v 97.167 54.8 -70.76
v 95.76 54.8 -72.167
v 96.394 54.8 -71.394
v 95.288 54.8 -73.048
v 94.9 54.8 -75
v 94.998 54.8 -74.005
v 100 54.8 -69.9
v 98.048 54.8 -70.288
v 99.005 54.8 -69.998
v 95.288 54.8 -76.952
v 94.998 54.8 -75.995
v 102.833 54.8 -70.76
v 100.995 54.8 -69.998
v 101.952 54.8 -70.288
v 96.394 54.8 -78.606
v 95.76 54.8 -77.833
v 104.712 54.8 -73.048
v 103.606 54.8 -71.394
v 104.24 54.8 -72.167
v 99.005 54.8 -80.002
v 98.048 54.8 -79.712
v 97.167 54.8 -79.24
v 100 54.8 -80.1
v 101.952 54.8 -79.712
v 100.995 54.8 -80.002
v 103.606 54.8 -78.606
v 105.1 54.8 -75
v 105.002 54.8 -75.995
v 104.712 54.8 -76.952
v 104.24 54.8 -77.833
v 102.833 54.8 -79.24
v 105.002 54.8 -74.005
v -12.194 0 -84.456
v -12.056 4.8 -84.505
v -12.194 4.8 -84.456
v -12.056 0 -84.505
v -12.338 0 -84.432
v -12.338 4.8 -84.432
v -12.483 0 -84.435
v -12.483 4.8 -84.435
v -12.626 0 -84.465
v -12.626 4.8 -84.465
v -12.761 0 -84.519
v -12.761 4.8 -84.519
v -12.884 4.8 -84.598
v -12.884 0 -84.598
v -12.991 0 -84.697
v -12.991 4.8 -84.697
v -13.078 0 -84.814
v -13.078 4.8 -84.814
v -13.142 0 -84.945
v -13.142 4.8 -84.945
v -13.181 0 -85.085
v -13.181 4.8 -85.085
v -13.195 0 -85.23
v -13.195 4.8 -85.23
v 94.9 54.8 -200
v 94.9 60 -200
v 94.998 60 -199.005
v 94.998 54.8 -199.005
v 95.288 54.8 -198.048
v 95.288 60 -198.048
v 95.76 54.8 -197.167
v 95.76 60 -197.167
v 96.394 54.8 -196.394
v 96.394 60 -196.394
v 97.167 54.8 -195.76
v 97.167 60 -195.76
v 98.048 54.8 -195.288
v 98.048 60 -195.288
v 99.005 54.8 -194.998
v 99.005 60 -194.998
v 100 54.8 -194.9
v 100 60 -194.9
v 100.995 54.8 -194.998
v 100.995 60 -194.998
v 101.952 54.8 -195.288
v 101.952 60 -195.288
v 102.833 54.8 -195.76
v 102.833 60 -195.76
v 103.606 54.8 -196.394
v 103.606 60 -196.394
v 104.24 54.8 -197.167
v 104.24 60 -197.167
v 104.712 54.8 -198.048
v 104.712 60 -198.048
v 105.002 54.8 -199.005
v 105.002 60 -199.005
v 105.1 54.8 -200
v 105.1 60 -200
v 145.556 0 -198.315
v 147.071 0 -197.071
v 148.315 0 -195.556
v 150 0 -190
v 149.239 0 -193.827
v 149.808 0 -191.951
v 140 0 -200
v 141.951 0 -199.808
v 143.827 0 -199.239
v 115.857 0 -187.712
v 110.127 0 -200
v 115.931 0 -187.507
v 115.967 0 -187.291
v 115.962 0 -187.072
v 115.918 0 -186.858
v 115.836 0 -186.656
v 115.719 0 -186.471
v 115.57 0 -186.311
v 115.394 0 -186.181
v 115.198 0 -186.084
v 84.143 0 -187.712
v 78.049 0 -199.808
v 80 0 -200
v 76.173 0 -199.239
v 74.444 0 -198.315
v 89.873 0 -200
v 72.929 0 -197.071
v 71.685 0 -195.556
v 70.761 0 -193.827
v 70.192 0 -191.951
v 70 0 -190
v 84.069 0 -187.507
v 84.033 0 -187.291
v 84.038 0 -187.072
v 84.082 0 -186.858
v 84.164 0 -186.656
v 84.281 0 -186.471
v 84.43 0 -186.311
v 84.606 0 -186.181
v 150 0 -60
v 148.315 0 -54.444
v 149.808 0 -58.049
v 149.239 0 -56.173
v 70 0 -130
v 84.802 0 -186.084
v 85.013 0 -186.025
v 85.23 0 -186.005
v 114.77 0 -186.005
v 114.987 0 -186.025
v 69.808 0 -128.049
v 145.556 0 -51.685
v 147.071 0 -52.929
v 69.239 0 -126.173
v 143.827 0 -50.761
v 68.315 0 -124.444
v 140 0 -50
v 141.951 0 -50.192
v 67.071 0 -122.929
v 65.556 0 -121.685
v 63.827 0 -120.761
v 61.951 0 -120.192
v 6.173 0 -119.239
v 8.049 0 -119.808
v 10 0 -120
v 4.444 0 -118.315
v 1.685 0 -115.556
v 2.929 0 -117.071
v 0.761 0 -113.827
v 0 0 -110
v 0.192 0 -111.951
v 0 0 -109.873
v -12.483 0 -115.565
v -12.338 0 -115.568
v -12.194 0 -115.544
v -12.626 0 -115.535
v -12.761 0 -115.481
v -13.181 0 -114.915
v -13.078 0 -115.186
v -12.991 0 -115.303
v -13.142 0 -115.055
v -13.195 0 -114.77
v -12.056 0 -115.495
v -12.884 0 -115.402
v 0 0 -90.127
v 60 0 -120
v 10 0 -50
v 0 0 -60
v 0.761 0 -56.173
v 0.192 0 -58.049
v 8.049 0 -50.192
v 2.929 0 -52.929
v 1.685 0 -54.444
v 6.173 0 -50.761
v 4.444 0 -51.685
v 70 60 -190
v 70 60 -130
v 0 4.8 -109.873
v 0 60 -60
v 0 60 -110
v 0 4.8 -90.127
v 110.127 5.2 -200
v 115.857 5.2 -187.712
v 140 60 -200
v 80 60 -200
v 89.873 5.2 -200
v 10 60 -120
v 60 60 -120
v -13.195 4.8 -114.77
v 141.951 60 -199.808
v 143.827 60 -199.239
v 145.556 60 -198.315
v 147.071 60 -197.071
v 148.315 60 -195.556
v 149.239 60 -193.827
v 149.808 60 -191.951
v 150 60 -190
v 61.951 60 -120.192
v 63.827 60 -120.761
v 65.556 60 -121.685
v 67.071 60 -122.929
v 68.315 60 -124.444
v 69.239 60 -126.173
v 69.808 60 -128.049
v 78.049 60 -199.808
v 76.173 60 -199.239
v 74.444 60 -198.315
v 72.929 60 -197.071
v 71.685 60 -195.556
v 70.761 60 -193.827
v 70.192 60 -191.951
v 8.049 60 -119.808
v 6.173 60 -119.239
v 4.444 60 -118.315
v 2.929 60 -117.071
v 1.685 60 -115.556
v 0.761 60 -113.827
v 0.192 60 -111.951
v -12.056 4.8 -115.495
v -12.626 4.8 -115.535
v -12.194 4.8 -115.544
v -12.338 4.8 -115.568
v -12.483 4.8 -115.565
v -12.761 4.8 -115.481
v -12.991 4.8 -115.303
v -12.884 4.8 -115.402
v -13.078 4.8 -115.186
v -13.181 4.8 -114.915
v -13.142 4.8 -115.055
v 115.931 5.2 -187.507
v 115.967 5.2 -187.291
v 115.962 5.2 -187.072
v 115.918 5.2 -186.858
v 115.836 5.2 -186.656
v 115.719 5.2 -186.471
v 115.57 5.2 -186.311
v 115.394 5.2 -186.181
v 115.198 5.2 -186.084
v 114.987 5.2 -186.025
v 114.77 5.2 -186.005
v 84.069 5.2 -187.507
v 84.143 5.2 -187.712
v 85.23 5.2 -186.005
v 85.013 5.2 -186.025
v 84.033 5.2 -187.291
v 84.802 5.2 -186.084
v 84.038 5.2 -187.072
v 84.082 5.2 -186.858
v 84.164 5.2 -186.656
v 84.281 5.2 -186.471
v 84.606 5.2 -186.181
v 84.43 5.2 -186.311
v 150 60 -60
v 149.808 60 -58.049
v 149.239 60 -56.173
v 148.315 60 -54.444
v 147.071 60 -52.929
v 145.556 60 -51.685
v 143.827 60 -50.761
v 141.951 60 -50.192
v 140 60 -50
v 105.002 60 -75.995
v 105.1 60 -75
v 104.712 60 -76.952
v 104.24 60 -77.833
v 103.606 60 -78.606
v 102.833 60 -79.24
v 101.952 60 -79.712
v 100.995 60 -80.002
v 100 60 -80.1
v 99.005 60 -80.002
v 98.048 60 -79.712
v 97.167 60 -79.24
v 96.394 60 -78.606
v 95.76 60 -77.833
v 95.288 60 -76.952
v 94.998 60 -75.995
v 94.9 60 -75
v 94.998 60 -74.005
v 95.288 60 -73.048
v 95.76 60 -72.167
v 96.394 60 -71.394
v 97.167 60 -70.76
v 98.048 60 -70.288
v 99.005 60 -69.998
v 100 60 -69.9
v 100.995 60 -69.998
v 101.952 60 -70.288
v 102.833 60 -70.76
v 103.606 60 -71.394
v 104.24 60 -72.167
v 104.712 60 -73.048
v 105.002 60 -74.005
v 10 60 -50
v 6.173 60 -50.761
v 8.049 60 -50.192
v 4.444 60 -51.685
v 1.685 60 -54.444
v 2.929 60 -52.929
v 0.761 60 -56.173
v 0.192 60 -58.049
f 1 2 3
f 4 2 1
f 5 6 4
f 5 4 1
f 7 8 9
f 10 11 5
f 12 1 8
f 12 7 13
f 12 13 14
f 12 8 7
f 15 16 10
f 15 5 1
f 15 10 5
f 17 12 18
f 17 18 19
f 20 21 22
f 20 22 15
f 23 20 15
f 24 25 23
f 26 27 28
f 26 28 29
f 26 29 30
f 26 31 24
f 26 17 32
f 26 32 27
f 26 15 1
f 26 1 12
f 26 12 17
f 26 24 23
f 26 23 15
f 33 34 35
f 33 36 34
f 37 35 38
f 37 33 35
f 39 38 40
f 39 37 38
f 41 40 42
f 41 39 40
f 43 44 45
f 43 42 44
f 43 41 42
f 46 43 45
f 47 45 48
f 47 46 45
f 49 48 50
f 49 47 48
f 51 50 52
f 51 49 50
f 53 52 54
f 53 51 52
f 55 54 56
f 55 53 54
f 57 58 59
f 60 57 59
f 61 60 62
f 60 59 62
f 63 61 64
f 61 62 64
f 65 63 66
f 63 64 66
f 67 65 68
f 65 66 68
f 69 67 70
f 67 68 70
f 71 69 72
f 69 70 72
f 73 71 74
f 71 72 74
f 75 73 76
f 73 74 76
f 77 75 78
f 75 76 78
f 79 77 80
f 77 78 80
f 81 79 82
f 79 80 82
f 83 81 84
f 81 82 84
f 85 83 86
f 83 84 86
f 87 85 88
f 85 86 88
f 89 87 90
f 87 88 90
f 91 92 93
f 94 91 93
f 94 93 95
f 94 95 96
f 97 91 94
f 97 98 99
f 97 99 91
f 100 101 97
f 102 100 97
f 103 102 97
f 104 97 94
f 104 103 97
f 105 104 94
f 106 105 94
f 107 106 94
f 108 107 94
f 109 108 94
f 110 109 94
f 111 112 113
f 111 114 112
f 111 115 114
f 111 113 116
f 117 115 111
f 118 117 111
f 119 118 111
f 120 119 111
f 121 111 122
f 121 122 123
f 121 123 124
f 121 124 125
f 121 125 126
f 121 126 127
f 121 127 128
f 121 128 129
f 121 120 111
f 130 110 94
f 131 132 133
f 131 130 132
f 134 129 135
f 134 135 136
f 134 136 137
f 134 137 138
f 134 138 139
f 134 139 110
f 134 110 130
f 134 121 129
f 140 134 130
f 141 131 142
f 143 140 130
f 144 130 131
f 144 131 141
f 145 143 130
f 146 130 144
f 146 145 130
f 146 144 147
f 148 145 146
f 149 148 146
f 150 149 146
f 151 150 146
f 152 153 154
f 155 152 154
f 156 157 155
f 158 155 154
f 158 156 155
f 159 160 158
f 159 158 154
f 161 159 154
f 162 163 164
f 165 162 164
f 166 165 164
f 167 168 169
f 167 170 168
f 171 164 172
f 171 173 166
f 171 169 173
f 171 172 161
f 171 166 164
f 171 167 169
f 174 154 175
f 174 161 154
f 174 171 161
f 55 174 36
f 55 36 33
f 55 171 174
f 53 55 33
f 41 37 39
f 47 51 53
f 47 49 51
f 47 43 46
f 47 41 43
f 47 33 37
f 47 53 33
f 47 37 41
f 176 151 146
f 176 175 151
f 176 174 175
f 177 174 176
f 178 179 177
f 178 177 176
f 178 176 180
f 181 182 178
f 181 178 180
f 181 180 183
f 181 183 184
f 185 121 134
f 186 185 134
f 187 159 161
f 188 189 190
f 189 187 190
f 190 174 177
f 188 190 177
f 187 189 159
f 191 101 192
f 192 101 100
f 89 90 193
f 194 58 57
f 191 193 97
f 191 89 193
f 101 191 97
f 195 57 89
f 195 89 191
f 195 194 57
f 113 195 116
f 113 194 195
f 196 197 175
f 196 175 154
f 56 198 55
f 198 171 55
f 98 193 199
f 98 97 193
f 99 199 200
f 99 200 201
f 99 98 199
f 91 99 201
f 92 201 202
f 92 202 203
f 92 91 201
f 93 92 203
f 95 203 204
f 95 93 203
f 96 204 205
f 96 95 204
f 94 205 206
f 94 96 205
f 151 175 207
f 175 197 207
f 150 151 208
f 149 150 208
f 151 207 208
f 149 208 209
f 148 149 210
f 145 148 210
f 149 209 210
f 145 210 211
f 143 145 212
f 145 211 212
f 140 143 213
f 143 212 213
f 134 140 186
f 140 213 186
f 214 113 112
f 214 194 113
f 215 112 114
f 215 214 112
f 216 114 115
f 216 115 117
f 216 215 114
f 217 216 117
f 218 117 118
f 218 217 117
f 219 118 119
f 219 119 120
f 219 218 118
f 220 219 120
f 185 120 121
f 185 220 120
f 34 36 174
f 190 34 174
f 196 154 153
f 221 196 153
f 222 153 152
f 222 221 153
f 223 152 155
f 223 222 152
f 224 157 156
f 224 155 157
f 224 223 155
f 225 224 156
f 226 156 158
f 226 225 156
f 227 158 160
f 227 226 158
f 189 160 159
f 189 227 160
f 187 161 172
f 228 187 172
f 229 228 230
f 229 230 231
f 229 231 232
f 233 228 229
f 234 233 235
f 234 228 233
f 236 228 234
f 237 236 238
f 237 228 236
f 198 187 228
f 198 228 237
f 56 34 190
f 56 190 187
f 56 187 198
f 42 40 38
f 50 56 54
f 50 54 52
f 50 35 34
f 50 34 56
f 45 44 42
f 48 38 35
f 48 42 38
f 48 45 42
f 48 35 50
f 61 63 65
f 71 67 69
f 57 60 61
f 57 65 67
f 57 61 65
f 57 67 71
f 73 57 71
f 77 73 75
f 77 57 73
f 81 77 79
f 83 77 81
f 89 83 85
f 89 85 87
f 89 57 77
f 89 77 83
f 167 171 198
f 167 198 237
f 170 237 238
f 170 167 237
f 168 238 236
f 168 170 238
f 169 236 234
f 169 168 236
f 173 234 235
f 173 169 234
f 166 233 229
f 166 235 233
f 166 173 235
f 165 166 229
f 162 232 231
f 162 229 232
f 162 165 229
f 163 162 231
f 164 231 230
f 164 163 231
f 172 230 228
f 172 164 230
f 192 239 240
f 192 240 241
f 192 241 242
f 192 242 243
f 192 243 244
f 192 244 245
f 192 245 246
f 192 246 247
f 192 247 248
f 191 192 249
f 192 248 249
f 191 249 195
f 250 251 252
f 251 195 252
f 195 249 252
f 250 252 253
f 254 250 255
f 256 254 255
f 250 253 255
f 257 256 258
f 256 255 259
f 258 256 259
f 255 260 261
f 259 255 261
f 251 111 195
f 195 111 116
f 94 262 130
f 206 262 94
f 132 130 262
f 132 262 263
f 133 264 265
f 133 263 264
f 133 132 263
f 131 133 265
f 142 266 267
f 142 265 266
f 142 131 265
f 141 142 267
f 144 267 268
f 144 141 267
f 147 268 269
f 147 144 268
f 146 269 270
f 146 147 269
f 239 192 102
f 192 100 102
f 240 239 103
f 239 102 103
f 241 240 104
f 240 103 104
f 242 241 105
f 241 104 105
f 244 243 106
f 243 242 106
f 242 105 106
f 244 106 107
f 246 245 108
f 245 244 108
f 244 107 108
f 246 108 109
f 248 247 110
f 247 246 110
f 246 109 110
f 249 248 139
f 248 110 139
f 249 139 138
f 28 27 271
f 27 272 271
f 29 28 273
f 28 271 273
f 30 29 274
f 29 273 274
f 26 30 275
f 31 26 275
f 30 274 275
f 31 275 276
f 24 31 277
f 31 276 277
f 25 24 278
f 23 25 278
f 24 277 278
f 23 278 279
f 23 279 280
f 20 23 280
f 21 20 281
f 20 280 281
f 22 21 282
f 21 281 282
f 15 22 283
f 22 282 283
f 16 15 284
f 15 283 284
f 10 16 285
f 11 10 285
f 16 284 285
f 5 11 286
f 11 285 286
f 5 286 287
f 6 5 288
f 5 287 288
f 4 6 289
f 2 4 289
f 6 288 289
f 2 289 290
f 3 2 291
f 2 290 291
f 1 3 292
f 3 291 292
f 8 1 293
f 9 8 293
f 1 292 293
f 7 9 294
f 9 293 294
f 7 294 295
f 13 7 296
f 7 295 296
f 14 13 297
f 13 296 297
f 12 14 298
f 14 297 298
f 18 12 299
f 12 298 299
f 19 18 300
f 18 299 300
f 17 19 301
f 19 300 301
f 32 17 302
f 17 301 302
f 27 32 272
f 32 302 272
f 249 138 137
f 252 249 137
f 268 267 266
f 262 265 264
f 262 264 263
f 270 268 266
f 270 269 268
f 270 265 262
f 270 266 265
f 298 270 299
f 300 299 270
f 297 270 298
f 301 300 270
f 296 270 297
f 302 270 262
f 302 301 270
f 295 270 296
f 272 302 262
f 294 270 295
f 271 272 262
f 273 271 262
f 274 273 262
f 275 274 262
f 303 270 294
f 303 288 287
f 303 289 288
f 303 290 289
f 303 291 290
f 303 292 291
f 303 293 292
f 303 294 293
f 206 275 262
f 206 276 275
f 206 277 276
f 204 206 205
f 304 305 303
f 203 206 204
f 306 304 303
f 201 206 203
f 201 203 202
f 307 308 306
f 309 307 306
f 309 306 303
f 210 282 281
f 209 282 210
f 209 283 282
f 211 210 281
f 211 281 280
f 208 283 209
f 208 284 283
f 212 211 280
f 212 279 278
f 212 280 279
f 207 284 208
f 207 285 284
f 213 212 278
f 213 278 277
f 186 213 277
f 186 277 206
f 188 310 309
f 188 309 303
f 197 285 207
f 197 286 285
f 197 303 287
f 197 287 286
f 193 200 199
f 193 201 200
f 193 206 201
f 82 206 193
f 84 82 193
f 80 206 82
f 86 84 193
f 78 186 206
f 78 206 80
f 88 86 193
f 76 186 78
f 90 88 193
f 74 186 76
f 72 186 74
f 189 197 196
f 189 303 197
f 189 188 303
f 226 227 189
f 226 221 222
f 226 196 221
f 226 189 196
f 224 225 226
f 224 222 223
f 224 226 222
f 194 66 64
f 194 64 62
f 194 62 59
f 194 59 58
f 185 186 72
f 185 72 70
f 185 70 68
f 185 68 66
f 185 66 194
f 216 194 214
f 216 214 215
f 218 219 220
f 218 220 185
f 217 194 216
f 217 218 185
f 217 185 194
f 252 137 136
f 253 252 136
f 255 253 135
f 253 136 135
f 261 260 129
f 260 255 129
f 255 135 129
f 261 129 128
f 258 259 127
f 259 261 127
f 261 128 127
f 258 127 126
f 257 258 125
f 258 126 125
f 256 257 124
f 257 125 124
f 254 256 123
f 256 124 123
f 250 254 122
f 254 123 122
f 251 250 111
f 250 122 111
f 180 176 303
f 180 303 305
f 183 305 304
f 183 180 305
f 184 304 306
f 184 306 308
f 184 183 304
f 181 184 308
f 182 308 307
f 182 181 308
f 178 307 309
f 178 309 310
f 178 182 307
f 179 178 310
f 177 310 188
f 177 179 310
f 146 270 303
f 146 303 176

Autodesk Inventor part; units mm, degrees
ref_plane "YZ Plane" through (0, 0, 0) normal (1, 0, 0) x (0, 1, 0)
ref_plane "XZ Plane" through (0, 0, 0) normal (0, 1, 0) x (-1, 0, 0)
ref_plane "XY Plane" through (0, 0, 0) normal (0, 0, 1) x (1, 0, 0)
sketch "Sketch1" plane through (0, 0, 0) normal (0, 1, 0) x (-1, 0, 0)
  line L0 (0, 0) -> (-200, 0)
  line L1 (-200, 0) -> (-200, -200)
  line L2 (-200, -200) -> (0, -200)
  line L3 (0, -200) -> (0, 0)
  line L4 (-89.8726, -200) -> (-110.1274, -200)
  line L5 (-114.7696, -186.0054) -> (-100, -186.0054)
  line L6 (-110.1274, -200) -> (-115.8572, -187.7125)
  arc A0 (-114.7696, -186.0054) -> (-115.8572, -187.7125) centre (-114.7696, -187.2054) ccw
  line L7 (-100, -186.0054) -> (-85.2304, -186.0054)
  line L8 (-90, -199.8) -> (-90, -186.3697) construction
  arc A1 (-84.1428, -187.7125) -> (-85.2304, -186.0054) centre (-85.2304, -187.2054) ccw
  line L9 (-84.1428, -187.7125) -> (-89.8726, -200)
  line L10 (-0.2, -90) -> (13.2303, -90) construction
  arc A2 (12.0565, -115.4946) -> (13.1946, -114.7696) centre (12.3946, -114.7696) ccw
  line L11 (0, -109.8726) -> (12.0565, -115.4946)
  line L12 (0, -90.1274) -> (0, -109.8726)
  line L13 (13.1946, -114.7696) -> (13.1946, -100)
  line L14 (12.0565, -84.5054) -> (0, -90.1274)
  line L15 (13.1946, -100) -> (13.1946, -85.2304)
  arc A3 (13.1946, -85.2304) -> (12.0565, -84.5054) centre (12.3946, -85.2304) ccw
  point P0 (-100, -200)
  point P1 (-100, -200)
  point P2 (-100, -200)
  point P3 (-83.6607, -186.2054)
  point P4 (-100, -200)
  point P5 (0, -100)
  point P6 (0, -100)
  point P7 (0, -100)
  point P8 (0, -100)
  point P9 (0, -100)
  point P10 (0, -100)
  dimension "d0" = 200
  dimension "d1" = 200
  dimension "d2" = 15
extrude "Extrusion1" add sketch "Sketch1" along normal blind 60 contours L3 L2 L9 A1 L7 L5 A0 L6 L1 L0 | L6 A0 L5 L7 A1 L9 L2
extrude "Extrusion3" cut sketch "Sketch1" along normal blind 5.2 contours L6 A0 L5 L7 A1 L9 L2
sketch "Sketch2" plane through (0, 60, 0) normal (0, 1, 0) x (1, 0, 0)
  point P0 (0, 0)
sketch "Sketch3" plane through (0, 60, 0) normal (0, 1, 0) x (1, 0, 0)
  line L0 (0, 0) -> (200, 0) projected
  circle A0 centre (100, 75) radius 5.1
  line L1 (200, 200) -> (0, 200) projected
  circle A1 centre (100, 200) radius 5.1
  dimension "d10" = 10.2
  dimension "d11" = 10.2
extrude "Extrusion4" cut sketch "Sketch3" against normal blind 5.2
extrude "Extrusion5" add sketch "Sketch1" along normal blind 4.8 contours L14 A3 L15 L13 A2 L11 L3
sketch "Sketch4" plane through (0, 60, 0) normal (0, 1, 0) x (1, 0, 0)
  line L0 (0, 200) -> (0, 0) projected
  line L1 (200, 0) -> (200, 200) projected
  line L2 (0, 0) -> (200, 0)
  line L3 (200, 0) -> (200, 50)
  line L4 (200, 50) -> (0, 50)
  line L5 (0, 50) -> (0, 0)
  line L6 (200, 200) -> (110.1274, 200) projected
  line L7 (200, 0) -> (130, 0)
  line L8 (130, 0) -> (130, 200)
  line L9 (130, 200) -> (200, 200)
  line L10 (200, 200) -> (200, 0)
  point P0 (130, 50)
  dimension "d16" = 50
  dimension "d17" = 70
extrude "Extrusion6" cut sketch "Sketch4" against normal blind 60
sketch "Sketch5" plane through (0, 0, 0) normal (0, -1, 0) x (1, 0, 0)
  line L0 (89.8726, -200) -> (0, -200) projected
  line L1 (0, -200) -> (70, -200)
  line L2 (70, -200) -> (70, -120)
  line L3 (70, -120) -> (0, -120)
  line L4 (0, -120) -> (0, -200)
  point P0 (0, 0)
  dimension "d20" = 70
  dimension "d21" = 80
extrude "Extrusion7" cut sketch "Sketch5" against normal blind 60
sketch "Sketch6" plane through (130, 60, -50) normal (1, 0, 0) x (0, 0, -1)
  line L0 (0, 0) -> (0, -60) projected
  line L1 (150, -60) -> (0, -60) projected
  line L2 (0, 0) -> (150, 0)
  line L3 (150, 0) -> (150, -60)
  line L4 (150, -60) -> (0, -60)
  line L5 (0, -60) -> (0, 0)
  point P0 (-50, -60)
extrude "Extrusion8" add sketch "Sketch6" along normal blind 20
fillet "Fillet2" radius 10 6 edges at (150, 30, -200) (70, 30, -200) (0, 30, -120) (150, 30, -50) (70, 30, -120) (0, 30, -50)
properties part number "Area øh1"
